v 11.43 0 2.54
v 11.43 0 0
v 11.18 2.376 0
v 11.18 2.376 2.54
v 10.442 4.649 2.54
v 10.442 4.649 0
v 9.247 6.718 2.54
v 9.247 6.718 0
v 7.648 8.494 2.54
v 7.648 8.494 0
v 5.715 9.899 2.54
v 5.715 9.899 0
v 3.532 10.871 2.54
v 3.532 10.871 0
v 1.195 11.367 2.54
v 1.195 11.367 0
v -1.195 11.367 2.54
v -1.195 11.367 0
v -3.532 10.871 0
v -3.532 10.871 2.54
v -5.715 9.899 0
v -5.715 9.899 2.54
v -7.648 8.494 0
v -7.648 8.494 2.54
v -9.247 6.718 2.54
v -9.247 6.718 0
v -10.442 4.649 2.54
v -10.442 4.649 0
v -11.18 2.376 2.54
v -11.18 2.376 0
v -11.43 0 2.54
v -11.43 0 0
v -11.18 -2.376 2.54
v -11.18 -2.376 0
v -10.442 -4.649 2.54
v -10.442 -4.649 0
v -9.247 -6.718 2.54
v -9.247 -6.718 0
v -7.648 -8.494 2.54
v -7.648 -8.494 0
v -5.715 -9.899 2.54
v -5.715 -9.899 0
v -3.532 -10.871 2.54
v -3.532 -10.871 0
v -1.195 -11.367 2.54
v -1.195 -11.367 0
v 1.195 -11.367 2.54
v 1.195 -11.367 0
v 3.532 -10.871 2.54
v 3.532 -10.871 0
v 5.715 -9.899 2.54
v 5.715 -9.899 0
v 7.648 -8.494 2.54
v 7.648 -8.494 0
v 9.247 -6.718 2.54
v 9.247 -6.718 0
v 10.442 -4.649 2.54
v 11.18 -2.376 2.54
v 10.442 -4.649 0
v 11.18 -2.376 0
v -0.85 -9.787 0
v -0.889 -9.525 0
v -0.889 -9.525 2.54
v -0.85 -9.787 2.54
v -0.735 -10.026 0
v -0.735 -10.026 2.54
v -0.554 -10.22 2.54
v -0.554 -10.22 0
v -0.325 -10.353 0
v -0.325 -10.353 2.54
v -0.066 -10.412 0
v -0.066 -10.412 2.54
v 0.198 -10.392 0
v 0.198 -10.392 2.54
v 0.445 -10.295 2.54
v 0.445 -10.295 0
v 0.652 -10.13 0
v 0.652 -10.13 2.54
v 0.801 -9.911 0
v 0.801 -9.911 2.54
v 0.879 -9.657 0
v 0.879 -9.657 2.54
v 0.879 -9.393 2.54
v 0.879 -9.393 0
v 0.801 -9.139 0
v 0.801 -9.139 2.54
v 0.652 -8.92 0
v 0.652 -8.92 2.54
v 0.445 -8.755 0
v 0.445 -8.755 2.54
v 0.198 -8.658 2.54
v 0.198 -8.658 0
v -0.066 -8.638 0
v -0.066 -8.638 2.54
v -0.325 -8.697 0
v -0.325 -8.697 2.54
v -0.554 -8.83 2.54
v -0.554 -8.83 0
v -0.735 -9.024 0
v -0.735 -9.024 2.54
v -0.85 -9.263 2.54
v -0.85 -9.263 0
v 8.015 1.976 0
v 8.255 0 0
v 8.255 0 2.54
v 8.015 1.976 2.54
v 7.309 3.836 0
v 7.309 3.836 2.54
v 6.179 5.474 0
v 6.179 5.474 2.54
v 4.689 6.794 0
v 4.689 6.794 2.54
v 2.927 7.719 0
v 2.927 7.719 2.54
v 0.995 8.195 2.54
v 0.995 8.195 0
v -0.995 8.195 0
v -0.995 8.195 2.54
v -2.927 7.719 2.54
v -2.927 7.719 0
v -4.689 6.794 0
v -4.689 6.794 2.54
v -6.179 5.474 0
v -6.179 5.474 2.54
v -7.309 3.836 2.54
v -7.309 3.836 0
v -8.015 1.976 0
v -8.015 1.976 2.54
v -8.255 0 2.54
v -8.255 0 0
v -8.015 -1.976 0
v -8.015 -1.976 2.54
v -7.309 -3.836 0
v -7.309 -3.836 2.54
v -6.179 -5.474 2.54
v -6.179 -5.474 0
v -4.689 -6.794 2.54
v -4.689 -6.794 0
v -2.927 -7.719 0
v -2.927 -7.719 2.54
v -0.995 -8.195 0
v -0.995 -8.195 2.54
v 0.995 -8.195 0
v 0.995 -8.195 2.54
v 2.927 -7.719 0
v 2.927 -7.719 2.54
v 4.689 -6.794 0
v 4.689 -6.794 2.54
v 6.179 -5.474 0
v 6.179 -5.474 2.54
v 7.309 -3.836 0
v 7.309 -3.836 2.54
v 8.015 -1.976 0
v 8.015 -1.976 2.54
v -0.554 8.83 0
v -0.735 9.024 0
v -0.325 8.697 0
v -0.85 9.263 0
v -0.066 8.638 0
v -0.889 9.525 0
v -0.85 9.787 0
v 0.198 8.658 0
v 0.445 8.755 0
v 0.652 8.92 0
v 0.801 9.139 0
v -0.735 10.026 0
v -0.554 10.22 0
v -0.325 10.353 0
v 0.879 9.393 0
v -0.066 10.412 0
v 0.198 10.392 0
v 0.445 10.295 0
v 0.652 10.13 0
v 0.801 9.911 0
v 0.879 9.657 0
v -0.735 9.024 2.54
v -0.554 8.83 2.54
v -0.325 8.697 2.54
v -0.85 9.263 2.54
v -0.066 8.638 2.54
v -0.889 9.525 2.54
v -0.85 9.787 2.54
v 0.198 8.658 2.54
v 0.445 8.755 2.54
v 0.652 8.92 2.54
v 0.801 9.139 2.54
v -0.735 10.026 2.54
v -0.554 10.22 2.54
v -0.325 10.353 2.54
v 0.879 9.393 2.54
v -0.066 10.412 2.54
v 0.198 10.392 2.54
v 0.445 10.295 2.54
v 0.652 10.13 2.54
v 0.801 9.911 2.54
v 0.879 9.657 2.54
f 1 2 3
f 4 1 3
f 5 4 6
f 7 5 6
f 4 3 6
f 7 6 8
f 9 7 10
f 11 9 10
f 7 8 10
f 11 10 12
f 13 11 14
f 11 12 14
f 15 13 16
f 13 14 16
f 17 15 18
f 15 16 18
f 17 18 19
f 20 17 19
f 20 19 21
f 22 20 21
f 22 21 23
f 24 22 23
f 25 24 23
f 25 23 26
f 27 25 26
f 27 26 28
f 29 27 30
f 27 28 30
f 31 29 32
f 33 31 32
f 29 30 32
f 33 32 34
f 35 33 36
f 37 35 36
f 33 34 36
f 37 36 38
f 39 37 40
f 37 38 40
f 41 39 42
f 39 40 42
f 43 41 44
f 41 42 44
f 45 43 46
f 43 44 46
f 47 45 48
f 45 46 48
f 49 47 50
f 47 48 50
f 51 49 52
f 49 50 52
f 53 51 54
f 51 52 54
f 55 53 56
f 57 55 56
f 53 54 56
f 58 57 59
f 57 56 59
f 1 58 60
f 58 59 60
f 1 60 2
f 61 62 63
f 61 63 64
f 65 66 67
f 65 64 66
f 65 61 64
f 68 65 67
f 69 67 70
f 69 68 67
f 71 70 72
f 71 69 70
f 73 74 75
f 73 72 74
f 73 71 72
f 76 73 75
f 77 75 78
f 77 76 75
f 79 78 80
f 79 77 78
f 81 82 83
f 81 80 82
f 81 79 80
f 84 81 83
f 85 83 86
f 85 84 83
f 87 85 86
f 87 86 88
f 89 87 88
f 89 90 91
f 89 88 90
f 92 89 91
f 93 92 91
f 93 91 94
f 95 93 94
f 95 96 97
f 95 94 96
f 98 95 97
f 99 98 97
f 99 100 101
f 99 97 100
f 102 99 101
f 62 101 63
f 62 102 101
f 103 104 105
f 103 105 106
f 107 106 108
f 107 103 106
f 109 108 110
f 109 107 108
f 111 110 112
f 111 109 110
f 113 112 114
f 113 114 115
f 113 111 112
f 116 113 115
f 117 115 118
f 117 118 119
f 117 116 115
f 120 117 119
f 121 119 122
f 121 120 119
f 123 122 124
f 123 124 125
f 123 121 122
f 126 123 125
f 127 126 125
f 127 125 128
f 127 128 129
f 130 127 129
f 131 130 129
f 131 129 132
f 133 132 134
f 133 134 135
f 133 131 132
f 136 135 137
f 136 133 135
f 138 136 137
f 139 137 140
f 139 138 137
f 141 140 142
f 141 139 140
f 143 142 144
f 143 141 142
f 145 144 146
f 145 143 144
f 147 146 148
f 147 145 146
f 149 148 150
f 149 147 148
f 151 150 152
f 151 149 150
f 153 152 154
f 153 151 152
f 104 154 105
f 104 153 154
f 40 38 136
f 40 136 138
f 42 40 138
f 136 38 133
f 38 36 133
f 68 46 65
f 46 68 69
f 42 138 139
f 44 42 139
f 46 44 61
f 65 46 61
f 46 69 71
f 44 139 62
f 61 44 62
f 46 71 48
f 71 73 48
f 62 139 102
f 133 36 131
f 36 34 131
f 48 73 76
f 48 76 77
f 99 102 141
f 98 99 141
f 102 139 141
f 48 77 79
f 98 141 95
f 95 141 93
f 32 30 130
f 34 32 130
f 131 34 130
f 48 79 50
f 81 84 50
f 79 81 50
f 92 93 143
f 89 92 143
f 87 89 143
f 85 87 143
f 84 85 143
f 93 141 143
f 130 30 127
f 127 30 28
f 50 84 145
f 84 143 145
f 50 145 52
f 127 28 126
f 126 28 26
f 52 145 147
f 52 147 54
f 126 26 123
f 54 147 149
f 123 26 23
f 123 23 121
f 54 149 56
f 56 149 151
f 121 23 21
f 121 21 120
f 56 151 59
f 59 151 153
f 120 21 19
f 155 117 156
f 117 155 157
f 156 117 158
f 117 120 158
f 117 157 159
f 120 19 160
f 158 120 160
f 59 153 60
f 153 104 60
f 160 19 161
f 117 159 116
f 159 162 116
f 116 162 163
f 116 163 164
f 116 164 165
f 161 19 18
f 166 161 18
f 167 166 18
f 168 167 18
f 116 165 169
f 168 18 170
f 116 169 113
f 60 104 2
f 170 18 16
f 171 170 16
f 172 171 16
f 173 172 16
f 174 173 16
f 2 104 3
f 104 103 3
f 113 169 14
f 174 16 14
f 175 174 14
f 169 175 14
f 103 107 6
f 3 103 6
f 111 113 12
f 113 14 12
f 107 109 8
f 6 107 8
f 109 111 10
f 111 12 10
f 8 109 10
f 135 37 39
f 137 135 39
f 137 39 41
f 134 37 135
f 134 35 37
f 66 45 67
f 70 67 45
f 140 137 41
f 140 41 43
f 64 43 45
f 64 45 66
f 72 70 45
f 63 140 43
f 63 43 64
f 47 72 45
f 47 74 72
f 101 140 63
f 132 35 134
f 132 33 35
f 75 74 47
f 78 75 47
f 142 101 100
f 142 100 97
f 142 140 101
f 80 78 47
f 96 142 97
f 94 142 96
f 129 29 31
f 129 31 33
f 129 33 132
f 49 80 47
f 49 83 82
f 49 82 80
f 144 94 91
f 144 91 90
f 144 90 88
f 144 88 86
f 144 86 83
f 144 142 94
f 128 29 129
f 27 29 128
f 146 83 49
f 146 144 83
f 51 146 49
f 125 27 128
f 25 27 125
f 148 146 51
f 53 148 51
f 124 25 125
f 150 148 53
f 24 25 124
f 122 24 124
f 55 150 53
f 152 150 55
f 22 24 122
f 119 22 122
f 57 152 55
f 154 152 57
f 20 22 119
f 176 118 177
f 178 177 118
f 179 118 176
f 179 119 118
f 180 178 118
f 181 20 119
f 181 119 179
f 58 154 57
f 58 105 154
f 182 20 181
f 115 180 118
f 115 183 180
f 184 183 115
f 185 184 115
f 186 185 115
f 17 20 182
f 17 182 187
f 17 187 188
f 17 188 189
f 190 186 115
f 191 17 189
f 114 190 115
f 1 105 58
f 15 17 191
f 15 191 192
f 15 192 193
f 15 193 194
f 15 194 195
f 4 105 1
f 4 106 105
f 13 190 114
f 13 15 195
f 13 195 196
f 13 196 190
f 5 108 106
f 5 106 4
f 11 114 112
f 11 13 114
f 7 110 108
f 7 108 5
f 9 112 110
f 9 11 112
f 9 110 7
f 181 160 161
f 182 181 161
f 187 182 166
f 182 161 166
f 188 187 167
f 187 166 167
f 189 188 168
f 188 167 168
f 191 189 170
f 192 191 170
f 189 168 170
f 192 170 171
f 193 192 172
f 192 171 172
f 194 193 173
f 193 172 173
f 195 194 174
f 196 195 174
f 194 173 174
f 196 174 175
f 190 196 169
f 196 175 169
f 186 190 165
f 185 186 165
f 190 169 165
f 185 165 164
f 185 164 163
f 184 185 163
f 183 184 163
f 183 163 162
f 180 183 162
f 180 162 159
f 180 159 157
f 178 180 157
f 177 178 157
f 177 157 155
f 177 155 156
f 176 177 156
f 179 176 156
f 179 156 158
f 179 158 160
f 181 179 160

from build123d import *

# Parameters (mm, degrees)
SKETCH1_R             = 11.43
SKETCH1_R_2           = 8.255
BOSS_EXTRUDE1_DEPTH   = 2.54
F_2_56_TAPPED_HOLE1_D = 1.778


with BuildPart() as part:
    # Sketch1 → Boss-Extrude1 (new body)
    with BuildSketch(Plane.XY):
        Circle(SKETCH1_R)
        Circle(SKETCH1_R_2, mode=Mode.SUBTRACT)
    extrude(amount=BOSS_EXTRUDE1_DEPTH)

    # #2-56 Tapped Hole1 (through all)
    with Locations(Plane.XY.offset(2.54)):
        with Locations((0, 9.525)):
            f_2_56_tapped_hole1 = Hole(F_2_56_TAPPED_HOLE1_D / 2)

    # Mirror1: #2-56 Tapped Hole1 across plane
    add(f_2_56_tapped_hole1.mirror(Plane.ZX), mode=Mode.SUBTRACT)


solid = part.part
